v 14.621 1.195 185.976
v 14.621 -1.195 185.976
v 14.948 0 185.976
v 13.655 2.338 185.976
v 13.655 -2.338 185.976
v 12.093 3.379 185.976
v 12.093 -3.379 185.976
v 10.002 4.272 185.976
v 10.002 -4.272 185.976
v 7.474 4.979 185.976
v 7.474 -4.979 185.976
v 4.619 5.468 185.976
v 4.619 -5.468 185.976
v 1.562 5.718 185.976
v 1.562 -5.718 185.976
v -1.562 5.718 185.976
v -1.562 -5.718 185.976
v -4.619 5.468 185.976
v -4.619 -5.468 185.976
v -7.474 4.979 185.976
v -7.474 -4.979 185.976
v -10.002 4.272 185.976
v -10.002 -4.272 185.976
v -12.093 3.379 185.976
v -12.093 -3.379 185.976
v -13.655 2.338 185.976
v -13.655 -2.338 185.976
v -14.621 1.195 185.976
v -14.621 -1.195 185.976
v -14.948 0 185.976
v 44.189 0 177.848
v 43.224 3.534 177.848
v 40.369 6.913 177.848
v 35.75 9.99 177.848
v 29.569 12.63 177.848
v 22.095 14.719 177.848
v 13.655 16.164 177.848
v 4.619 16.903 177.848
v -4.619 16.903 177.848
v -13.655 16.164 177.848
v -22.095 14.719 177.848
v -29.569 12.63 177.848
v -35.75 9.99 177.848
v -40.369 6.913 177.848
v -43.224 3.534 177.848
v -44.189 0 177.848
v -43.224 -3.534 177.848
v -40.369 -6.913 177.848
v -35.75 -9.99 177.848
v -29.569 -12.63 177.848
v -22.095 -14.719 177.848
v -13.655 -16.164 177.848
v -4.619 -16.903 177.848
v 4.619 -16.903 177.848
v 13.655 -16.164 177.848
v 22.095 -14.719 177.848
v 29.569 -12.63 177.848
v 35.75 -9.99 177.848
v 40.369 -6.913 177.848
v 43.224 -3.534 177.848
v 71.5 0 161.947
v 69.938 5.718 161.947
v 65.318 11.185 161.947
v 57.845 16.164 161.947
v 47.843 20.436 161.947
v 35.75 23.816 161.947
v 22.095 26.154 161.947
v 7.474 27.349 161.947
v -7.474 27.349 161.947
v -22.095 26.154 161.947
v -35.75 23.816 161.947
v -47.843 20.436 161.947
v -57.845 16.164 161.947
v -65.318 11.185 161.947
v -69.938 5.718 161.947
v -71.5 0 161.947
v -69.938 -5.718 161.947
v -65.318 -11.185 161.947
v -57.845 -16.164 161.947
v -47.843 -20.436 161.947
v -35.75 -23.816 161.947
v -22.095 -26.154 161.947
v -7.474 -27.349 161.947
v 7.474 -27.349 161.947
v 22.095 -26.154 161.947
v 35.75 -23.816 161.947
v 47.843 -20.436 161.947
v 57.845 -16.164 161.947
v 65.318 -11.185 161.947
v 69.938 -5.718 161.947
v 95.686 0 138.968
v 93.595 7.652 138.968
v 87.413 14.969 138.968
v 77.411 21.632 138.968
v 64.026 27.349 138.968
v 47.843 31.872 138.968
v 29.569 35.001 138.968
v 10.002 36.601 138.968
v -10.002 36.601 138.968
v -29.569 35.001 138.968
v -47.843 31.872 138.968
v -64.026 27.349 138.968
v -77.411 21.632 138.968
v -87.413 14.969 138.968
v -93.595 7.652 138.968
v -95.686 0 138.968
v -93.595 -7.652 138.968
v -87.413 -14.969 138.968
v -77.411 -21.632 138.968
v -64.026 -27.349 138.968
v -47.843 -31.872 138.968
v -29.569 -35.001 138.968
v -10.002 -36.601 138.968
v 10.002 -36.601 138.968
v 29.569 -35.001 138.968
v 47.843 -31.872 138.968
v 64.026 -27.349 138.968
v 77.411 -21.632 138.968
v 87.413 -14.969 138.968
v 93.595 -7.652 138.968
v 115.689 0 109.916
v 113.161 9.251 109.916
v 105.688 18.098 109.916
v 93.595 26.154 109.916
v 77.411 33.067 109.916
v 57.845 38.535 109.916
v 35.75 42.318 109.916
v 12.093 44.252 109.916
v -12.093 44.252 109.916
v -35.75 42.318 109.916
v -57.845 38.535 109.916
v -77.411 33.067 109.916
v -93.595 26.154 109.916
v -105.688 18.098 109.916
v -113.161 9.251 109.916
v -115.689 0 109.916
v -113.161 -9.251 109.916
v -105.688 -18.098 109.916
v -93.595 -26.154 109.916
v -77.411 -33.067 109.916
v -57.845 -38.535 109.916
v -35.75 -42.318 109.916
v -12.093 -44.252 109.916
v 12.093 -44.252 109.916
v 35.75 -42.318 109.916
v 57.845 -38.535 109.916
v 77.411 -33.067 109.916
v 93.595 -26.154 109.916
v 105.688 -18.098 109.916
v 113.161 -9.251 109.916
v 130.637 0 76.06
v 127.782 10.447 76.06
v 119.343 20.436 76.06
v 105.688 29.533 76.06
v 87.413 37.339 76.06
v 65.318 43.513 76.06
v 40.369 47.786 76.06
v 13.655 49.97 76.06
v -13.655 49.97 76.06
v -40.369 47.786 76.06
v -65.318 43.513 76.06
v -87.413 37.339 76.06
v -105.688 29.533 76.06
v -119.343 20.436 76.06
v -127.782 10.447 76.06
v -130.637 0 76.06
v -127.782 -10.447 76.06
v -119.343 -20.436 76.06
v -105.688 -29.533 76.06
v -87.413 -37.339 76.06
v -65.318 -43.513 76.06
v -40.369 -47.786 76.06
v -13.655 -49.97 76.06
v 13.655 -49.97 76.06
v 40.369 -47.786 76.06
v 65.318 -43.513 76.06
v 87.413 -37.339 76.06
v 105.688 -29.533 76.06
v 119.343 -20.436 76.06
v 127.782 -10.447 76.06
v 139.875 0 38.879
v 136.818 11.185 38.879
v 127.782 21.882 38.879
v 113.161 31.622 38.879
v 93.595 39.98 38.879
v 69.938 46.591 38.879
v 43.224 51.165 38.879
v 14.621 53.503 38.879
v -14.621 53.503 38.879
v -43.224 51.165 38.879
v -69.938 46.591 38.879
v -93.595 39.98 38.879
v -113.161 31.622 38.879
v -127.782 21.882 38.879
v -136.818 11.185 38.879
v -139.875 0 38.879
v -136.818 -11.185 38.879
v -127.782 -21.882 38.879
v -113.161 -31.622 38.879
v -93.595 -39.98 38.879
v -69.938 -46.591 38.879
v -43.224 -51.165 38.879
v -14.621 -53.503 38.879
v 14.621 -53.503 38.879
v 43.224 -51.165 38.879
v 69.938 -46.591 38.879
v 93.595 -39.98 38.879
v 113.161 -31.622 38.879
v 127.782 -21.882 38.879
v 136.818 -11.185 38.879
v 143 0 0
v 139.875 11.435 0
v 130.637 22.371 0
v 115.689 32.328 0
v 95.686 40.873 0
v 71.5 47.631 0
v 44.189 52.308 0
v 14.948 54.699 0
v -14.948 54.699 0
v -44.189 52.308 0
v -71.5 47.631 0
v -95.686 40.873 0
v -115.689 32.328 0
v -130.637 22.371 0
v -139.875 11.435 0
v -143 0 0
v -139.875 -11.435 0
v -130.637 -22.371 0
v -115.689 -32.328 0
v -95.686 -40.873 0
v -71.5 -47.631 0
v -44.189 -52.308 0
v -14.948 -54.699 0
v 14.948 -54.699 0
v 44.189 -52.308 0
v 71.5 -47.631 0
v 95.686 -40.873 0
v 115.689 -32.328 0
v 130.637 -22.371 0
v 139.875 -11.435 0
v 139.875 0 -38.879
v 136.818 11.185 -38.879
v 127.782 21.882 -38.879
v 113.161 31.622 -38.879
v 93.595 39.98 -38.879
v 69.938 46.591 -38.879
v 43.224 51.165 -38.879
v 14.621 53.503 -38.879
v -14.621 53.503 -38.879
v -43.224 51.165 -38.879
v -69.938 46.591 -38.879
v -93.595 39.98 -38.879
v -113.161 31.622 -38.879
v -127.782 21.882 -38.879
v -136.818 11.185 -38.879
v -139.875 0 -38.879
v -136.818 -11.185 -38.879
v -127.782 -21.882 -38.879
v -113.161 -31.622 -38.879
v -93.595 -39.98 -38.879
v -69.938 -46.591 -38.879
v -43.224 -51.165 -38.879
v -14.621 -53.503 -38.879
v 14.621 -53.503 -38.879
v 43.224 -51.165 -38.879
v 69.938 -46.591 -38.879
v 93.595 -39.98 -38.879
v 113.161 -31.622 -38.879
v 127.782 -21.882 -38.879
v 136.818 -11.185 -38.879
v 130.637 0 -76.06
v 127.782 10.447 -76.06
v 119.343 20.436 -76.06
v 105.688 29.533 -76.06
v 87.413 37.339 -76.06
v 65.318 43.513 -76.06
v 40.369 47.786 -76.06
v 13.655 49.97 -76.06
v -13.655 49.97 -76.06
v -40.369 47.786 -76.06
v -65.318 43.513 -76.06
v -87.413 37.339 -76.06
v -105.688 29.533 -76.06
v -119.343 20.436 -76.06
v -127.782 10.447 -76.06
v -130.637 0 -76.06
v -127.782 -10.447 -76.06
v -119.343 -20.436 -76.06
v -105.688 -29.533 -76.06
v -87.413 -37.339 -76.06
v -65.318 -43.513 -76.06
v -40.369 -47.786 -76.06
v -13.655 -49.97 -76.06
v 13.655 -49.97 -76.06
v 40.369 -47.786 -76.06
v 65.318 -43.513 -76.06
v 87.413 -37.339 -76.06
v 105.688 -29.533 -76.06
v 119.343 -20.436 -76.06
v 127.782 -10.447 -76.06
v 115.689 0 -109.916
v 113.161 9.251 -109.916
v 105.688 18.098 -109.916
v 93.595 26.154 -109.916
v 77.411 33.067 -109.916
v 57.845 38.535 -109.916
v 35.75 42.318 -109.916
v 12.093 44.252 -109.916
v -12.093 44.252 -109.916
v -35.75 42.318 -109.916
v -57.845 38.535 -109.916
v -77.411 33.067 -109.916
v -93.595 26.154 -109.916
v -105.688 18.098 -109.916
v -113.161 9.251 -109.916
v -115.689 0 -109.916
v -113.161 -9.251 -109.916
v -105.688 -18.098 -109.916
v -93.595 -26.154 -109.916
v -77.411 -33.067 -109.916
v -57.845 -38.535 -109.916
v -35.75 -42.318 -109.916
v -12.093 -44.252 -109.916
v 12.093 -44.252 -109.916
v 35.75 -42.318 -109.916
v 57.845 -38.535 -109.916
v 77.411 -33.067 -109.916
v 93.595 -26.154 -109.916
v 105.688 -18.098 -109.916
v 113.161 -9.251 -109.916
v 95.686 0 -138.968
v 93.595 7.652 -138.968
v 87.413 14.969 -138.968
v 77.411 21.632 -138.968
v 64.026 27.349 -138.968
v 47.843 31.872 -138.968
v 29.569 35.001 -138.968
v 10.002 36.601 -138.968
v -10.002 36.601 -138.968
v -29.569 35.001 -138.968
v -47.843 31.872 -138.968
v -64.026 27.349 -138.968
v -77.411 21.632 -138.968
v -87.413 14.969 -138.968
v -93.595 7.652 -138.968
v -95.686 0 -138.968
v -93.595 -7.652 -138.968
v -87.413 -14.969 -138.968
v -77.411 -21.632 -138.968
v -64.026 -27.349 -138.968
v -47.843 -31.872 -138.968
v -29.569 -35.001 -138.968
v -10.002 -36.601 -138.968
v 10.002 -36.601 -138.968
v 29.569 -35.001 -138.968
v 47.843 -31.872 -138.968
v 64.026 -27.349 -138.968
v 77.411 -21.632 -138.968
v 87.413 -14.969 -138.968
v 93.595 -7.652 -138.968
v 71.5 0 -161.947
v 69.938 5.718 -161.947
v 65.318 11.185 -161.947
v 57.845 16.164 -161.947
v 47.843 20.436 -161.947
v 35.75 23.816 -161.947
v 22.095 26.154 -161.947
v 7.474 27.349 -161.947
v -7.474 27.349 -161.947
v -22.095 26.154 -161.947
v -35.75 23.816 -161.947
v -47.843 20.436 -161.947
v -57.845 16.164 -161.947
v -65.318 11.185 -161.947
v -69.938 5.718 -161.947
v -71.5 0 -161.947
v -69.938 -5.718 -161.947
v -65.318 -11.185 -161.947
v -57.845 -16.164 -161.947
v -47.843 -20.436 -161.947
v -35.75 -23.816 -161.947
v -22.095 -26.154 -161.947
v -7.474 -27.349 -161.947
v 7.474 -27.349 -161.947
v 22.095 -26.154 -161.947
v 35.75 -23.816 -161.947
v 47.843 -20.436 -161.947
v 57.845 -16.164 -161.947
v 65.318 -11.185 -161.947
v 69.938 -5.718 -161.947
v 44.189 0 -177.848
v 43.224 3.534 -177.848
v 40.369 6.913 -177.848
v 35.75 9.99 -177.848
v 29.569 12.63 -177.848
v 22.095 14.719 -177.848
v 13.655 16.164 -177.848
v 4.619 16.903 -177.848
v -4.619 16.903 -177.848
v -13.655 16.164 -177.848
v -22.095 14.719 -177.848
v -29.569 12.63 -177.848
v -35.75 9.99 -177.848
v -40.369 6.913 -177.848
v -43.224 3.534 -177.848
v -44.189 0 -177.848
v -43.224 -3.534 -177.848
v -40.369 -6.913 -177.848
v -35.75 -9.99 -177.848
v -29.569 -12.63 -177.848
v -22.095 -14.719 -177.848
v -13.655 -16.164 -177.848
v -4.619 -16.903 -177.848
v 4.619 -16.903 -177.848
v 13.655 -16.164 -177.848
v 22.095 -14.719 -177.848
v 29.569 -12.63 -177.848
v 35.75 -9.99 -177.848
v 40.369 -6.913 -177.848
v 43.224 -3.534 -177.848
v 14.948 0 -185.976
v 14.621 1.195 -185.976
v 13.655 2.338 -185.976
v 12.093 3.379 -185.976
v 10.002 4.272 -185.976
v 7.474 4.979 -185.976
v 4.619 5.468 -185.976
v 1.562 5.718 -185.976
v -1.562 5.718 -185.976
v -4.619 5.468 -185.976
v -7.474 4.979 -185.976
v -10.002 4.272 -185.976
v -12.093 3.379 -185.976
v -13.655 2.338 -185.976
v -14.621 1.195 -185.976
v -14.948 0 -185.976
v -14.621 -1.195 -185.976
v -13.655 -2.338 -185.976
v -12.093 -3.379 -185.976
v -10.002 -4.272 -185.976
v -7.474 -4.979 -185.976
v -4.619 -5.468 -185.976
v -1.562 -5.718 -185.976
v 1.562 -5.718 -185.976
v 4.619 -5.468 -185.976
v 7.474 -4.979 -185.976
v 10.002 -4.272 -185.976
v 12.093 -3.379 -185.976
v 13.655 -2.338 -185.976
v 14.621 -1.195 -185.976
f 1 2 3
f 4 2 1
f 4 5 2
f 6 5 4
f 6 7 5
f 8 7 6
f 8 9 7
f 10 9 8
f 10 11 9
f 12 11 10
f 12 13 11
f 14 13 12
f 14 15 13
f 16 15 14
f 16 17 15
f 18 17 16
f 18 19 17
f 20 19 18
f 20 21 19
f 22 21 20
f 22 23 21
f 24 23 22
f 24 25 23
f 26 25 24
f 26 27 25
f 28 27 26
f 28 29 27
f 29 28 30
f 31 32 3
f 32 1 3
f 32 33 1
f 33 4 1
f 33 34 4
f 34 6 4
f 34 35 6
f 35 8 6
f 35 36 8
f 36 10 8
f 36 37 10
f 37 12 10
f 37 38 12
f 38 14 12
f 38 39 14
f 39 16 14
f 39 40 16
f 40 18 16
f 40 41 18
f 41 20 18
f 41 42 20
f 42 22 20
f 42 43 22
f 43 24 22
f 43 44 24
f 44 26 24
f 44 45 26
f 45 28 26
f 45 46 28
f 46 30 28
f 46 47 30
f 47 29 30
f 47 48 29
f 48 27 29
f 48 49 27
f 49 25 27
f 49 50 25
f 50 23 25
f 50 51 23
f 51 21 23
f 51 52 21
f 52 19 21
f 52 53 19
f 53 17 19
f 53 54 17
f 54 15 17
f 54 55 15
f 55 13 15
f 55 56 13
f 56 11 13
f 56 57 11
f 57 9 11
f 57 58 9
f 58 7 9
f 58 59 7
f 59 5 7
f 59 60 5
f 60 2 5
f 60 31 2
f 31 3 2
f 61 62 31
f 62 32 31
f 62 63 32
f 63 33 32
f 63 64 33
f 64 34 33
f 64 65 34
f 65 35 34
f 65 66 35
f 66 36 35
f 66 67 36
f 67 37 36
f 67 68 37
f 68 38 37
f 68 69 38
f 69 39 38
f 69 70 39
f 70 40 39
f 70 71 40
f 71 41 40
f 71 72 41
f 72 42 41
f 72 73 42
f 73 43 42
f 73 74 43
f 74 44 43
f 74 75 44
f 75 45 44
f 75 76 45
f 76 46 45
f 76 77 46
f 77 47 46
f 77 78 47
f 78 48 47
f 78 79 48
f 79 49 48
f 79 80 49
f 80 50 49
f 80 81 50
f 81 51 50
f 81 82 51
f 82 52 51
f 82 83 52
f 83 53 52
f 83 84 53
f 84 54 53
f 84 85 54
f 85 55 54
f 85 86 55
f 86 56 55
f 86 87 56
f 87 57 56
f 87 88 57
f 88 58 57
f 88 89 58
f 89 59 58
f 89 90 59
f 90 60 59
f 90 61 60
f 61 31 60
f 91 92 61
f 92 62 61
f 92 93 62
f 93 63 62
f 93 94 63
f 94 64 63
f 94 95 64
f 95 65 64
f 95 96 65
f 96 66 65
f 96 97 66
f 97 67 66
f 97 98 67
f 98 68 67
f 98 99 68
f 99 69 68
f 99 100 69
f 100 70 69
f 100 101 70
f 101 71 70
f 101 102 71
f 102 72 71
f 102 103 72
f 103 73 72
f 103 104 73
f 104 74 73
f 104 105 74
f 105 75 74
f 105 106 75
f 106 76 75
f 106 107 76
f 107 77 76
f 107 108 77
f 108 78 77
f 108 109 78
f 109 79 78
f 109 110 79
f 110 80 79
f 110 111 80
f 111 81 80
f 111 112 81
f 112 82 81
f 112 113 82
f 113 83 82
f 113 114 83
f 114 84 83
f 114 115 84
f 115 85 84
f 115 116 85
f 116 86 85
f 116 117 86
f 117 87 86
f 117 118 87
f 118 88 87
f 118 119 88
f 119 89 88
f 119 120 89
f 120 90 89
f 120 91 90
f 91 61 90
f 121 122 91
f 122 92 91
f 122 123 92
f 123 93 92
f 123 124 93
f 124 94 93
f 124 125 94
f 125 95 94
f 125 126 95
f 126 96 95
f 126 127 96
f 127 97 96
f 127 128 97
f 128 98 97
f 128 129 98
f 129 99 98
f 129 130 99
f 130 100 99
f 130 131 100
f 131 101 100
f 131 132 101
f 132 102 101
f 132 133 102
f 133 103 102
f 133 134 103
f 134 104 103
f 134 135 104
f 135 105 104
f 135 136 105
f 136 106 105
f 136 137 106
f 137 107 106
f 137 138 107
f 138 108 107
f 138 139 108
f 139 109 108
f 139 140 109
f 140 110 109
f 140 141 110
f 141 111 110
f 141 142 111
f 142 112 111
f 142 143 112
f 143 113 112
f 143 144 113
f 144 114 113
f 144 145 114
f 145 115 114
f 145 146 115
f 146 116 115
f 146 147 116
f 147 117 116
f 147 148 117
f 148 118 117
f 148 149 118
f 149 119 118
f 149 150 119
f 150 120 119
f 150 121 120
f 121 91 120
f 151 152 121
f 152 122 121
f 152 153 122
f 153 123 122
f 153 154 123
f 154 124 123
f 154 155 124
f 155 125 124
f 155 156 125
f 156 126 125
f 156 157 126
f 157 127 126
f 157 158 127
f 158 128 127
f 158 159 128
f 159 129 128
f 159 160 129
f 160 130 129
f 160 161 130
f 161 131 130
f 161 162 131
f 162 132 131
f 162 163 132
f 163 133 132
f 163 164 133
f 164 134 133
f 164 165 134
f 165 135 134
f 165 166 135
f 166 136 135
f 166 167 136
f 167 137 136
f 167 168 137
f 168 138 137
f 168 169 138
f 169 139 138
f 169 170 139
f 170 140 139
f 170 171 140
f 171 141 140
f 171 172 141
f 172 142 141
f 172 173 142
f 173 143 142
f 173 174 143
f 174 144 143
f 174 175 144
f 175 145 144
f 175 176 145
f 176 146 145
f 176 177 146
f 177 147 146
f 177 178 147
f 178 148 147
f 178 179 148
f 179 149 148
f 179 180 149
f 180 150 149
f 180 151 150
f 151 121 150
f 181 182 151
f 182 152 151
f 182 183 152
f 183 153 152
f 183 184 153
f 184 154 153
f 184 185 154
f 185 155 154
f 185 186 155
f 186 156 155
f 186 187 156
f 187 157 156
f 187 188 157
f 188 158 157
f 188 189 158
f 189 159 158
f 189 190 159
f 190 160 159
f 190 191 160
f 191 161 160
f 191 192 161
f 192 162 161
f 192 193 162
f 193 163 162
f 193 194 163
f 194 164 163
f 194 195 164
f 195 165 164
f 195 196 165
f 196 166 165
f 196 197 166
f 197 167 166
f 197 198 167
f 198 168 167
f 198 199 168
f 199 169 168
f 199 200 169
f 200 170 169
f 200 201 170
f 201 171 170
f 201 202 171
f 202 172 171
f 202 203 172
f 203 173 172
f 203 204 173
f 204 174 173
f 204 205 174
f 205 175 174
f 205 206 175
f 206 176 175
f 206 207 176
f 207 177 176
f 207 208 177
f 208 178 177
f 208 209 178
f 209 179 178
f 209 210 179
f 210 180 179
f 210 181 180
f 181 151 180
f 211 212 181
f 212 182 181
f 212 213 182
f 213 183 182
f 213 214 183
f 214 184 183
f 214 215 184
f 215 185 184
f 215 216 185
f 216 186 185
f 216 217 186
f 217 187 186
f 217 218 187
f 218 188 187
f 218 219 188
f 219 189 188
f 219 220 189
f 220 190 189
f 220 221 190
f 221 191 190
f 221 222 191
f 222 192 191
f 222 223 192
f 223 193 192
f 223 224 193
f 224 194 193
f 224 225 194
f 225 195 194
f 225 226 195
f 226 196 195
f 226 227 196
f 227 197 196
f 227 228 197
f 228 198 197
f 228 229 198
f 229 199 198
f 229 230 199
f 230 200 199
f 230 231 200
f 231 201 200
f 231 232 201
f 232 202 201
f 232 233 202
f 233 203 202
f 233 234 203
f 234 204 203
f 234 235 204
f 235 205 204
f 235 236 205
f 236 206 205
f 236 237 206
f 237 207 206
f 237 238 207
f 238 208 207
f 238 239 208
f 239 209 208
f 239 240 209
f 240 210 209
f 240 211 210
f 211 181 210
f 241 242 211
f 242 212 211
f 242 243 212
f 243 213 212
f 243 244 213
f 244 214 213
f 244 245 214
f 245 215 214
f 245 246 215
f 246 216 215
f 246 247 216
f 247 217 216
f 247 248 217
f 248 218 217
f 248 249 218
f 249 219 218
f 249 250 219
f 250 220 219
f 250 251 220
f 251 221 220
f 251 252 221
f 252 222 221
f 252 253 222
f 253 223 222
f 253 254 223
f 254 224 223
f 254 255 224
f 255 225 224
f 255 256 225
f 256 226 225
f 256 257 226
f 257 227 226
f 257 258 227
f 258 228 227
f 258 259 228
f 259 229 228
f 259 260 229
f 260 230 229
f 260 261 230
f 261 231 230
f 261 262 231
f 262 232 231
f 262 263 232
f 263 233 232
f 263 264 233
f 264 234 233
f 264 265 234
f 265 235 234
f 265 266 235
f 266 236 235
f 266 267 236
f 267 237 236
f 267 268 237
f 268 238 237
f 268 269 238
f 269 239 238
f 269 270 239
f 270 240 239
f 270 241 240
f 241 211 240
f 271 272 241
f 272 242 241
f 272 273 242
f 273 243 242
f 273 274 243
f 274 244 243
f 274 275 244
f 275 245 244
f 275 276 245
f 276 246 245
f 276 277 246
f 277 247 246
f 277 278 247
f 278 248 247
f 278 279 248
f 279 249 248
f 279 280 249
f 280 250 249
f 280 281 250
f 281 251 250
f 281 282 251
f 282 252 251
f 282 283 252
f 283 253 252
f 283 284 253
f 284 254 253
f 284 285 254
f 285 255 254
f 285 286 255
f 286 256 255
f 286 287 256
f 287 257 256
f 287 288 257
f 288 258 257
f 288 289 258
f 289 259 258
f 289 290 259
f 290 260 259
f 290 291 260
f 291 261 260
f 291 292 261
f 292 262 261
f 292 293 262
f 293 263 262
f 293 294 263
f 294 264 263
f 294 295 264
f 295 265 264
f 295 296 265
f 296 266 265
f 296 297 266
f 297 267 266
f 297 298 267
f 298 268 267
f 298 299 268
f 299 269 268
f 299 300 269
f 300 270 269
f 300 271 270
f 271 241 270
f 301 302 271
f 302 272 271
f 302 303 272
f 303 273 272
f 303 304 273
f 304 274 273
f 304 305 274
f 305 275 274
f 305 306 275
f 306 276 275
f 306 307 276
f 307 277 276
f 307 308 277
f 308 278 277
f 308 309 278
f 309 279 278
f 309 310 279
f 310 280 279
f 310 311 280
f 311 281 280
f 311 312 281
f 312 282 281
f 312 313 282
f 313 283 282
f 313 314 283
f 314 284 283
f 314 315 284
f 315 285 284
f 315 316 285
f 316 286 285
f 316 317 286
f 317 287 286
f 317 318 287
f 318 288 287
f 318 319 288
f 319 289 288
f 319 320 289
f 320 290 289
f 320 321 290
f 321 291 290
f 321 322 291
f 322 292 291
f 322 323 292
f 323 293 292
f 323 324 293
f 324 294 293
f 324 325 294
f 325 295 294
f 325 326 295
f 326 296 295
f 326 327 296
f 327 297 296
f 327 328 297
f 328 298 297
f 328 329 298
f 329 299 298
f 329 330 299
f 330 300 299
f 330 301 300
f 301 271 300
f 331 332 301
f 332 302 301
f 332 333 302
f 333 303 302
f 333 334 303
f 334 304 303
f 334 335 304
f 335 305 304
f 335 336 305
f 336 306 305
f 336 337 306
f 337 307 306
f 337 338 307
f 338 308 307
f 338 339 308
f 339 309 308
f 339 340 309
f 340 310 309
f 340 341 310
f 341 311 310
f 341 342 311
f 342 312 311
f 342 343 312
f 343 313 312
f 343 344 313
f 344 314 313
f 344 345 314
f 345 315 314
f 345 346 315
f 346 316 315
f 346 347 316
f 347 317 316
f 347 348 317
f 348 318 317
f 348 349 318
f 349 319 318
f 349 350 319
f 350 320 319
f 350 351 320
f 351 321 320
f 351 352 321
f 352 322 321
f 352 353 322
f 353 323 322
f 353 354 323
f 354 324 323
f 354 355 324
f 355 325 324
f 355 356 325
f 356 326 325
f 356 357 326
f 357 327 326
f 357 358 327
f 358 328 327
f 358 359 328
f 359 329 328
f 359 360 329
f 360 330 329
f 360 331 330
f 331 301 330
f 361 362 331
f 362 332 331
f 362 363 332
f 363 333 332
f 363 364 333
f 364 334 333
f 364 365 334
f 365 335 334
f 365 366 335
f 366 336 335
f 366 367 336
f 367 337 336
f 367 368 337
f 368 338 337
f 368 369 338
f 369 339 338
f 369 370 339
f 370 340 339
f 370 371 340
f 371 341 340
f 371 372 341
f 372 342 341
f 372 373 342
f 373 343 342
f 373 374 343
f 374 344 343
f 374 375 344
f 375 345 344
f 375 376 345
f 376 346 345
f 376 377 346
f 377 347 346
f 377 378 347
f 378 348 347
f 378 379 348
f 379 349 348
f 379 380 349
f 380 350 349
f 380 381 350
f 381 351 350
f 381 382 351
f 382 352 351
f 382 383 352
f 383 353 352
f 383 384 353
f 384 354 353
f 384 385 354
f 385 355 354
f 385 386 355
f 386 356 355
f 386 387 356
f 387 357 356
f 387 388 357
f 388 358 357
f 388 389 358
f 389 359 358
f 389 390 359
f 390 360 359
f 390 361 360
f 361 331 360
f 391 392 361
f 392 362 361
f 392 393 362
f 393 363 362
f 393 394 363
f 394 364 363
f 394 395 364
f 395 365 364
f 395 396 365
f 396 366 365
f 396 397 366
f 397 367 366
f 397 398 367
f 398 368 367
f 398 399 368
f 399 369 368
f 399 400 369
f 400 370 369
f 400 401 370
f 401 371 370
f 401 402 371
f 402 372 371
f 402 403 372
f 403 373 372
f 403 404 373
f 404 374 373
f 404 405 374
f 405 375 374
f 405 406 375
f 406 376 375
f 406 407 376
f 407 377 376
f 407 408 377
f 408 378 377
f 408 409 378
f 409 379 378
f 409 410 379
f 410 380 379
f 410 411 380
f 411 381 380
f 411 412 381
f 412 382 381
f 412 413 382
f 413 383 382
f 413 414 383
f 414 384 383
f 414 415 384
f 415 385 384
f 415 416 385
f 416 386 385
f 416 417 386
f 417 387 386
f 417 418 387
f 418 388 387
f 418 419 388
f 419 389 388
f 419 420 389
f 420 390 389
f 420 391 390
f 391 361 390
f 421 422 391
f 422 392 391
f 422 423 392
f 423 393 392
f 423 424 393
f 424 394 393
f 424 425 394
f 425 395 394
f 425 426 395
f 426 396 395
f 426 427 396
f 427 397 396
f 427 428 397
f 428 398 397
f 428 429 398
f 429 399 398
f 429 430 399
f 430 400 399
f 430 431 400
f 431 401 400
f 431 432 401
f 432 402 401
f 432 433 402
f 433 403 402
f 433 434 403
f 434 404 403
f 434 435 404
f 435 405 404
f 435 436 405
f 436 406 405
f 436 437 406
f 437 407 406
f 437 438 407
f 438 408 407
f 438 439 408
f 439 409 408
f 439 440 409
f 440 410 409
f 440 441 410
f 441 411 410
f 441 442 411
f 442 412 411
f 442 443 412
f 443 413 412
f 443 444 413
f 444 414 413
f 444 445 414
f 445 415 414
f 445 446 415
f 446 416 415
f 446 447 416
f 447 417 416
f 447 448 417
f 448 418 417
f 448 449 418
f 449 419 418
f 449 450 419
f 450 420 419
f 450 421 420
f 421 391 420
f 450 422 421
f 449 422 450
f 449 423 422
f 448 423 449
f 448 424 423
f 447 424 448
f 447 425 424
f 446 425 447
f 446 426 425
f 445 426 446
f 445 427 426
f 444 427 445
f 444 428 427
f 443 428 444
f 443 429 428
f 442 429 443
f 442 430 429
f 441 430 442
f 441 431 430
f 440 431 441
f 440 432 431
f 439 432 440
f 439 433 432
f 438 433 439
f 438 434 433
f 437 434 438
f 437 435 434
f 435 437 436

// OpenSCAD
// Generated by SolidPython 1.0.1 on 2020-07-29 00:46:50


scale(v = [13, 5, 17]) {
	sphere(r = 11);
}
/***********************************************
*********      SolidPython code:      **********
************************************************
 
# import packages: SolidPython
from solid import *
from solid.utils import *
from itertools import chain, combinations, permutations


class Resize:

    def __init__(self, scad_file):
        self.scad_file = scad_file
        #self.scad_file = import_scad(scad_file)
        # cone/cylinder param:
        self.r1 = 0
        self.r2 = 0
        self.h = 0
        # rectangular prism param:
        self.w = 0
        self.l = 0
        # ellipse param:
        self.r = 0

    # import OpenScad code (file name corresponds to shape)


    # classify shape + parameters
    def assign(self, param1, param2, param3):
        if self.scad_file == 'cone.scad':
            self.r1 = param1
            self.r2 = param2
            self.h = param3
        elif self.scad_file == 'cylinder.scad':
            self.r1 = param1
            self.r2 = param2
            self.h = param3
        elif self.scad_file == 'rectangularPrism.scad':
            self.h = param1
            self.l = param2
            self.w = param3
        else:
            self.r = param1
            self.h = param2

    # resize parameters
    def iterate(self):
        x = range(3, 20, 2)
        i = 1
        if self.scad_file == 'cone.scad':
            tempList = list(permutations(x, 2))
            for temp in tempList:
                param1 = temp[0]
                param2 = temp[1]
                filepath = 'produced_scad_files/' + 'cone' + str(param1) + '_' + str(param2) + '_' + '.scad'
                scad_render_to_file(cylinder(h=param1, r1=param2, r2=0), filepath)

        elif self.scad_file == 'cylinder.scad':
            tempList = list(permutations(x, 3))
            for temp in tempList:
                param1 = temp[0]
                param2 = temp[1]
                filepath = 'produced_scad_files/' + 'cylinder' + str(param1) + '_' + str(param2) + '_' + '.scad'
                scad_render_to_file(cylinder(h=param1, r1=param2, r2=param2), filepath)

        elif self.scad_file == 'rectangularPrism.scad':
            tempList = list(permutations(x, 3))
            for temp in tempList:
                param1 = temp[0]
                param2 = temp[1]
                param3 = temp[2]
                filepath = 'produced_scad_files/' + 'rectangularPrism' + str(param1) + '_' + str(param2) + '_' + str(
                    param3) + '.scad'
                scad_render_to_file(cube(size=(param1, param2, param3)), filepath)

        elif self.scad_file == 'ellipse.scad':
            tempList = list(permutations(x, 4))
            for temp in tempList:
                param1 = temp[0]
                param2 = temp[1]
                param3 = temp[2]
                param4 = temp[3]
                filepath = 'produced_scad_files/' + 'ellipse' + str(param1) + '_' + str(param2) + '_' + str(param3) + '_' + str(param4) + '.scad'
                scad_render_to_file(scale([param1, param2, param3])(sphere(r=param4)), filepath)

    def render_to_scadfile(self):
        scad_render_to_file(scad, 'example.scad') 
 
************************************************/
